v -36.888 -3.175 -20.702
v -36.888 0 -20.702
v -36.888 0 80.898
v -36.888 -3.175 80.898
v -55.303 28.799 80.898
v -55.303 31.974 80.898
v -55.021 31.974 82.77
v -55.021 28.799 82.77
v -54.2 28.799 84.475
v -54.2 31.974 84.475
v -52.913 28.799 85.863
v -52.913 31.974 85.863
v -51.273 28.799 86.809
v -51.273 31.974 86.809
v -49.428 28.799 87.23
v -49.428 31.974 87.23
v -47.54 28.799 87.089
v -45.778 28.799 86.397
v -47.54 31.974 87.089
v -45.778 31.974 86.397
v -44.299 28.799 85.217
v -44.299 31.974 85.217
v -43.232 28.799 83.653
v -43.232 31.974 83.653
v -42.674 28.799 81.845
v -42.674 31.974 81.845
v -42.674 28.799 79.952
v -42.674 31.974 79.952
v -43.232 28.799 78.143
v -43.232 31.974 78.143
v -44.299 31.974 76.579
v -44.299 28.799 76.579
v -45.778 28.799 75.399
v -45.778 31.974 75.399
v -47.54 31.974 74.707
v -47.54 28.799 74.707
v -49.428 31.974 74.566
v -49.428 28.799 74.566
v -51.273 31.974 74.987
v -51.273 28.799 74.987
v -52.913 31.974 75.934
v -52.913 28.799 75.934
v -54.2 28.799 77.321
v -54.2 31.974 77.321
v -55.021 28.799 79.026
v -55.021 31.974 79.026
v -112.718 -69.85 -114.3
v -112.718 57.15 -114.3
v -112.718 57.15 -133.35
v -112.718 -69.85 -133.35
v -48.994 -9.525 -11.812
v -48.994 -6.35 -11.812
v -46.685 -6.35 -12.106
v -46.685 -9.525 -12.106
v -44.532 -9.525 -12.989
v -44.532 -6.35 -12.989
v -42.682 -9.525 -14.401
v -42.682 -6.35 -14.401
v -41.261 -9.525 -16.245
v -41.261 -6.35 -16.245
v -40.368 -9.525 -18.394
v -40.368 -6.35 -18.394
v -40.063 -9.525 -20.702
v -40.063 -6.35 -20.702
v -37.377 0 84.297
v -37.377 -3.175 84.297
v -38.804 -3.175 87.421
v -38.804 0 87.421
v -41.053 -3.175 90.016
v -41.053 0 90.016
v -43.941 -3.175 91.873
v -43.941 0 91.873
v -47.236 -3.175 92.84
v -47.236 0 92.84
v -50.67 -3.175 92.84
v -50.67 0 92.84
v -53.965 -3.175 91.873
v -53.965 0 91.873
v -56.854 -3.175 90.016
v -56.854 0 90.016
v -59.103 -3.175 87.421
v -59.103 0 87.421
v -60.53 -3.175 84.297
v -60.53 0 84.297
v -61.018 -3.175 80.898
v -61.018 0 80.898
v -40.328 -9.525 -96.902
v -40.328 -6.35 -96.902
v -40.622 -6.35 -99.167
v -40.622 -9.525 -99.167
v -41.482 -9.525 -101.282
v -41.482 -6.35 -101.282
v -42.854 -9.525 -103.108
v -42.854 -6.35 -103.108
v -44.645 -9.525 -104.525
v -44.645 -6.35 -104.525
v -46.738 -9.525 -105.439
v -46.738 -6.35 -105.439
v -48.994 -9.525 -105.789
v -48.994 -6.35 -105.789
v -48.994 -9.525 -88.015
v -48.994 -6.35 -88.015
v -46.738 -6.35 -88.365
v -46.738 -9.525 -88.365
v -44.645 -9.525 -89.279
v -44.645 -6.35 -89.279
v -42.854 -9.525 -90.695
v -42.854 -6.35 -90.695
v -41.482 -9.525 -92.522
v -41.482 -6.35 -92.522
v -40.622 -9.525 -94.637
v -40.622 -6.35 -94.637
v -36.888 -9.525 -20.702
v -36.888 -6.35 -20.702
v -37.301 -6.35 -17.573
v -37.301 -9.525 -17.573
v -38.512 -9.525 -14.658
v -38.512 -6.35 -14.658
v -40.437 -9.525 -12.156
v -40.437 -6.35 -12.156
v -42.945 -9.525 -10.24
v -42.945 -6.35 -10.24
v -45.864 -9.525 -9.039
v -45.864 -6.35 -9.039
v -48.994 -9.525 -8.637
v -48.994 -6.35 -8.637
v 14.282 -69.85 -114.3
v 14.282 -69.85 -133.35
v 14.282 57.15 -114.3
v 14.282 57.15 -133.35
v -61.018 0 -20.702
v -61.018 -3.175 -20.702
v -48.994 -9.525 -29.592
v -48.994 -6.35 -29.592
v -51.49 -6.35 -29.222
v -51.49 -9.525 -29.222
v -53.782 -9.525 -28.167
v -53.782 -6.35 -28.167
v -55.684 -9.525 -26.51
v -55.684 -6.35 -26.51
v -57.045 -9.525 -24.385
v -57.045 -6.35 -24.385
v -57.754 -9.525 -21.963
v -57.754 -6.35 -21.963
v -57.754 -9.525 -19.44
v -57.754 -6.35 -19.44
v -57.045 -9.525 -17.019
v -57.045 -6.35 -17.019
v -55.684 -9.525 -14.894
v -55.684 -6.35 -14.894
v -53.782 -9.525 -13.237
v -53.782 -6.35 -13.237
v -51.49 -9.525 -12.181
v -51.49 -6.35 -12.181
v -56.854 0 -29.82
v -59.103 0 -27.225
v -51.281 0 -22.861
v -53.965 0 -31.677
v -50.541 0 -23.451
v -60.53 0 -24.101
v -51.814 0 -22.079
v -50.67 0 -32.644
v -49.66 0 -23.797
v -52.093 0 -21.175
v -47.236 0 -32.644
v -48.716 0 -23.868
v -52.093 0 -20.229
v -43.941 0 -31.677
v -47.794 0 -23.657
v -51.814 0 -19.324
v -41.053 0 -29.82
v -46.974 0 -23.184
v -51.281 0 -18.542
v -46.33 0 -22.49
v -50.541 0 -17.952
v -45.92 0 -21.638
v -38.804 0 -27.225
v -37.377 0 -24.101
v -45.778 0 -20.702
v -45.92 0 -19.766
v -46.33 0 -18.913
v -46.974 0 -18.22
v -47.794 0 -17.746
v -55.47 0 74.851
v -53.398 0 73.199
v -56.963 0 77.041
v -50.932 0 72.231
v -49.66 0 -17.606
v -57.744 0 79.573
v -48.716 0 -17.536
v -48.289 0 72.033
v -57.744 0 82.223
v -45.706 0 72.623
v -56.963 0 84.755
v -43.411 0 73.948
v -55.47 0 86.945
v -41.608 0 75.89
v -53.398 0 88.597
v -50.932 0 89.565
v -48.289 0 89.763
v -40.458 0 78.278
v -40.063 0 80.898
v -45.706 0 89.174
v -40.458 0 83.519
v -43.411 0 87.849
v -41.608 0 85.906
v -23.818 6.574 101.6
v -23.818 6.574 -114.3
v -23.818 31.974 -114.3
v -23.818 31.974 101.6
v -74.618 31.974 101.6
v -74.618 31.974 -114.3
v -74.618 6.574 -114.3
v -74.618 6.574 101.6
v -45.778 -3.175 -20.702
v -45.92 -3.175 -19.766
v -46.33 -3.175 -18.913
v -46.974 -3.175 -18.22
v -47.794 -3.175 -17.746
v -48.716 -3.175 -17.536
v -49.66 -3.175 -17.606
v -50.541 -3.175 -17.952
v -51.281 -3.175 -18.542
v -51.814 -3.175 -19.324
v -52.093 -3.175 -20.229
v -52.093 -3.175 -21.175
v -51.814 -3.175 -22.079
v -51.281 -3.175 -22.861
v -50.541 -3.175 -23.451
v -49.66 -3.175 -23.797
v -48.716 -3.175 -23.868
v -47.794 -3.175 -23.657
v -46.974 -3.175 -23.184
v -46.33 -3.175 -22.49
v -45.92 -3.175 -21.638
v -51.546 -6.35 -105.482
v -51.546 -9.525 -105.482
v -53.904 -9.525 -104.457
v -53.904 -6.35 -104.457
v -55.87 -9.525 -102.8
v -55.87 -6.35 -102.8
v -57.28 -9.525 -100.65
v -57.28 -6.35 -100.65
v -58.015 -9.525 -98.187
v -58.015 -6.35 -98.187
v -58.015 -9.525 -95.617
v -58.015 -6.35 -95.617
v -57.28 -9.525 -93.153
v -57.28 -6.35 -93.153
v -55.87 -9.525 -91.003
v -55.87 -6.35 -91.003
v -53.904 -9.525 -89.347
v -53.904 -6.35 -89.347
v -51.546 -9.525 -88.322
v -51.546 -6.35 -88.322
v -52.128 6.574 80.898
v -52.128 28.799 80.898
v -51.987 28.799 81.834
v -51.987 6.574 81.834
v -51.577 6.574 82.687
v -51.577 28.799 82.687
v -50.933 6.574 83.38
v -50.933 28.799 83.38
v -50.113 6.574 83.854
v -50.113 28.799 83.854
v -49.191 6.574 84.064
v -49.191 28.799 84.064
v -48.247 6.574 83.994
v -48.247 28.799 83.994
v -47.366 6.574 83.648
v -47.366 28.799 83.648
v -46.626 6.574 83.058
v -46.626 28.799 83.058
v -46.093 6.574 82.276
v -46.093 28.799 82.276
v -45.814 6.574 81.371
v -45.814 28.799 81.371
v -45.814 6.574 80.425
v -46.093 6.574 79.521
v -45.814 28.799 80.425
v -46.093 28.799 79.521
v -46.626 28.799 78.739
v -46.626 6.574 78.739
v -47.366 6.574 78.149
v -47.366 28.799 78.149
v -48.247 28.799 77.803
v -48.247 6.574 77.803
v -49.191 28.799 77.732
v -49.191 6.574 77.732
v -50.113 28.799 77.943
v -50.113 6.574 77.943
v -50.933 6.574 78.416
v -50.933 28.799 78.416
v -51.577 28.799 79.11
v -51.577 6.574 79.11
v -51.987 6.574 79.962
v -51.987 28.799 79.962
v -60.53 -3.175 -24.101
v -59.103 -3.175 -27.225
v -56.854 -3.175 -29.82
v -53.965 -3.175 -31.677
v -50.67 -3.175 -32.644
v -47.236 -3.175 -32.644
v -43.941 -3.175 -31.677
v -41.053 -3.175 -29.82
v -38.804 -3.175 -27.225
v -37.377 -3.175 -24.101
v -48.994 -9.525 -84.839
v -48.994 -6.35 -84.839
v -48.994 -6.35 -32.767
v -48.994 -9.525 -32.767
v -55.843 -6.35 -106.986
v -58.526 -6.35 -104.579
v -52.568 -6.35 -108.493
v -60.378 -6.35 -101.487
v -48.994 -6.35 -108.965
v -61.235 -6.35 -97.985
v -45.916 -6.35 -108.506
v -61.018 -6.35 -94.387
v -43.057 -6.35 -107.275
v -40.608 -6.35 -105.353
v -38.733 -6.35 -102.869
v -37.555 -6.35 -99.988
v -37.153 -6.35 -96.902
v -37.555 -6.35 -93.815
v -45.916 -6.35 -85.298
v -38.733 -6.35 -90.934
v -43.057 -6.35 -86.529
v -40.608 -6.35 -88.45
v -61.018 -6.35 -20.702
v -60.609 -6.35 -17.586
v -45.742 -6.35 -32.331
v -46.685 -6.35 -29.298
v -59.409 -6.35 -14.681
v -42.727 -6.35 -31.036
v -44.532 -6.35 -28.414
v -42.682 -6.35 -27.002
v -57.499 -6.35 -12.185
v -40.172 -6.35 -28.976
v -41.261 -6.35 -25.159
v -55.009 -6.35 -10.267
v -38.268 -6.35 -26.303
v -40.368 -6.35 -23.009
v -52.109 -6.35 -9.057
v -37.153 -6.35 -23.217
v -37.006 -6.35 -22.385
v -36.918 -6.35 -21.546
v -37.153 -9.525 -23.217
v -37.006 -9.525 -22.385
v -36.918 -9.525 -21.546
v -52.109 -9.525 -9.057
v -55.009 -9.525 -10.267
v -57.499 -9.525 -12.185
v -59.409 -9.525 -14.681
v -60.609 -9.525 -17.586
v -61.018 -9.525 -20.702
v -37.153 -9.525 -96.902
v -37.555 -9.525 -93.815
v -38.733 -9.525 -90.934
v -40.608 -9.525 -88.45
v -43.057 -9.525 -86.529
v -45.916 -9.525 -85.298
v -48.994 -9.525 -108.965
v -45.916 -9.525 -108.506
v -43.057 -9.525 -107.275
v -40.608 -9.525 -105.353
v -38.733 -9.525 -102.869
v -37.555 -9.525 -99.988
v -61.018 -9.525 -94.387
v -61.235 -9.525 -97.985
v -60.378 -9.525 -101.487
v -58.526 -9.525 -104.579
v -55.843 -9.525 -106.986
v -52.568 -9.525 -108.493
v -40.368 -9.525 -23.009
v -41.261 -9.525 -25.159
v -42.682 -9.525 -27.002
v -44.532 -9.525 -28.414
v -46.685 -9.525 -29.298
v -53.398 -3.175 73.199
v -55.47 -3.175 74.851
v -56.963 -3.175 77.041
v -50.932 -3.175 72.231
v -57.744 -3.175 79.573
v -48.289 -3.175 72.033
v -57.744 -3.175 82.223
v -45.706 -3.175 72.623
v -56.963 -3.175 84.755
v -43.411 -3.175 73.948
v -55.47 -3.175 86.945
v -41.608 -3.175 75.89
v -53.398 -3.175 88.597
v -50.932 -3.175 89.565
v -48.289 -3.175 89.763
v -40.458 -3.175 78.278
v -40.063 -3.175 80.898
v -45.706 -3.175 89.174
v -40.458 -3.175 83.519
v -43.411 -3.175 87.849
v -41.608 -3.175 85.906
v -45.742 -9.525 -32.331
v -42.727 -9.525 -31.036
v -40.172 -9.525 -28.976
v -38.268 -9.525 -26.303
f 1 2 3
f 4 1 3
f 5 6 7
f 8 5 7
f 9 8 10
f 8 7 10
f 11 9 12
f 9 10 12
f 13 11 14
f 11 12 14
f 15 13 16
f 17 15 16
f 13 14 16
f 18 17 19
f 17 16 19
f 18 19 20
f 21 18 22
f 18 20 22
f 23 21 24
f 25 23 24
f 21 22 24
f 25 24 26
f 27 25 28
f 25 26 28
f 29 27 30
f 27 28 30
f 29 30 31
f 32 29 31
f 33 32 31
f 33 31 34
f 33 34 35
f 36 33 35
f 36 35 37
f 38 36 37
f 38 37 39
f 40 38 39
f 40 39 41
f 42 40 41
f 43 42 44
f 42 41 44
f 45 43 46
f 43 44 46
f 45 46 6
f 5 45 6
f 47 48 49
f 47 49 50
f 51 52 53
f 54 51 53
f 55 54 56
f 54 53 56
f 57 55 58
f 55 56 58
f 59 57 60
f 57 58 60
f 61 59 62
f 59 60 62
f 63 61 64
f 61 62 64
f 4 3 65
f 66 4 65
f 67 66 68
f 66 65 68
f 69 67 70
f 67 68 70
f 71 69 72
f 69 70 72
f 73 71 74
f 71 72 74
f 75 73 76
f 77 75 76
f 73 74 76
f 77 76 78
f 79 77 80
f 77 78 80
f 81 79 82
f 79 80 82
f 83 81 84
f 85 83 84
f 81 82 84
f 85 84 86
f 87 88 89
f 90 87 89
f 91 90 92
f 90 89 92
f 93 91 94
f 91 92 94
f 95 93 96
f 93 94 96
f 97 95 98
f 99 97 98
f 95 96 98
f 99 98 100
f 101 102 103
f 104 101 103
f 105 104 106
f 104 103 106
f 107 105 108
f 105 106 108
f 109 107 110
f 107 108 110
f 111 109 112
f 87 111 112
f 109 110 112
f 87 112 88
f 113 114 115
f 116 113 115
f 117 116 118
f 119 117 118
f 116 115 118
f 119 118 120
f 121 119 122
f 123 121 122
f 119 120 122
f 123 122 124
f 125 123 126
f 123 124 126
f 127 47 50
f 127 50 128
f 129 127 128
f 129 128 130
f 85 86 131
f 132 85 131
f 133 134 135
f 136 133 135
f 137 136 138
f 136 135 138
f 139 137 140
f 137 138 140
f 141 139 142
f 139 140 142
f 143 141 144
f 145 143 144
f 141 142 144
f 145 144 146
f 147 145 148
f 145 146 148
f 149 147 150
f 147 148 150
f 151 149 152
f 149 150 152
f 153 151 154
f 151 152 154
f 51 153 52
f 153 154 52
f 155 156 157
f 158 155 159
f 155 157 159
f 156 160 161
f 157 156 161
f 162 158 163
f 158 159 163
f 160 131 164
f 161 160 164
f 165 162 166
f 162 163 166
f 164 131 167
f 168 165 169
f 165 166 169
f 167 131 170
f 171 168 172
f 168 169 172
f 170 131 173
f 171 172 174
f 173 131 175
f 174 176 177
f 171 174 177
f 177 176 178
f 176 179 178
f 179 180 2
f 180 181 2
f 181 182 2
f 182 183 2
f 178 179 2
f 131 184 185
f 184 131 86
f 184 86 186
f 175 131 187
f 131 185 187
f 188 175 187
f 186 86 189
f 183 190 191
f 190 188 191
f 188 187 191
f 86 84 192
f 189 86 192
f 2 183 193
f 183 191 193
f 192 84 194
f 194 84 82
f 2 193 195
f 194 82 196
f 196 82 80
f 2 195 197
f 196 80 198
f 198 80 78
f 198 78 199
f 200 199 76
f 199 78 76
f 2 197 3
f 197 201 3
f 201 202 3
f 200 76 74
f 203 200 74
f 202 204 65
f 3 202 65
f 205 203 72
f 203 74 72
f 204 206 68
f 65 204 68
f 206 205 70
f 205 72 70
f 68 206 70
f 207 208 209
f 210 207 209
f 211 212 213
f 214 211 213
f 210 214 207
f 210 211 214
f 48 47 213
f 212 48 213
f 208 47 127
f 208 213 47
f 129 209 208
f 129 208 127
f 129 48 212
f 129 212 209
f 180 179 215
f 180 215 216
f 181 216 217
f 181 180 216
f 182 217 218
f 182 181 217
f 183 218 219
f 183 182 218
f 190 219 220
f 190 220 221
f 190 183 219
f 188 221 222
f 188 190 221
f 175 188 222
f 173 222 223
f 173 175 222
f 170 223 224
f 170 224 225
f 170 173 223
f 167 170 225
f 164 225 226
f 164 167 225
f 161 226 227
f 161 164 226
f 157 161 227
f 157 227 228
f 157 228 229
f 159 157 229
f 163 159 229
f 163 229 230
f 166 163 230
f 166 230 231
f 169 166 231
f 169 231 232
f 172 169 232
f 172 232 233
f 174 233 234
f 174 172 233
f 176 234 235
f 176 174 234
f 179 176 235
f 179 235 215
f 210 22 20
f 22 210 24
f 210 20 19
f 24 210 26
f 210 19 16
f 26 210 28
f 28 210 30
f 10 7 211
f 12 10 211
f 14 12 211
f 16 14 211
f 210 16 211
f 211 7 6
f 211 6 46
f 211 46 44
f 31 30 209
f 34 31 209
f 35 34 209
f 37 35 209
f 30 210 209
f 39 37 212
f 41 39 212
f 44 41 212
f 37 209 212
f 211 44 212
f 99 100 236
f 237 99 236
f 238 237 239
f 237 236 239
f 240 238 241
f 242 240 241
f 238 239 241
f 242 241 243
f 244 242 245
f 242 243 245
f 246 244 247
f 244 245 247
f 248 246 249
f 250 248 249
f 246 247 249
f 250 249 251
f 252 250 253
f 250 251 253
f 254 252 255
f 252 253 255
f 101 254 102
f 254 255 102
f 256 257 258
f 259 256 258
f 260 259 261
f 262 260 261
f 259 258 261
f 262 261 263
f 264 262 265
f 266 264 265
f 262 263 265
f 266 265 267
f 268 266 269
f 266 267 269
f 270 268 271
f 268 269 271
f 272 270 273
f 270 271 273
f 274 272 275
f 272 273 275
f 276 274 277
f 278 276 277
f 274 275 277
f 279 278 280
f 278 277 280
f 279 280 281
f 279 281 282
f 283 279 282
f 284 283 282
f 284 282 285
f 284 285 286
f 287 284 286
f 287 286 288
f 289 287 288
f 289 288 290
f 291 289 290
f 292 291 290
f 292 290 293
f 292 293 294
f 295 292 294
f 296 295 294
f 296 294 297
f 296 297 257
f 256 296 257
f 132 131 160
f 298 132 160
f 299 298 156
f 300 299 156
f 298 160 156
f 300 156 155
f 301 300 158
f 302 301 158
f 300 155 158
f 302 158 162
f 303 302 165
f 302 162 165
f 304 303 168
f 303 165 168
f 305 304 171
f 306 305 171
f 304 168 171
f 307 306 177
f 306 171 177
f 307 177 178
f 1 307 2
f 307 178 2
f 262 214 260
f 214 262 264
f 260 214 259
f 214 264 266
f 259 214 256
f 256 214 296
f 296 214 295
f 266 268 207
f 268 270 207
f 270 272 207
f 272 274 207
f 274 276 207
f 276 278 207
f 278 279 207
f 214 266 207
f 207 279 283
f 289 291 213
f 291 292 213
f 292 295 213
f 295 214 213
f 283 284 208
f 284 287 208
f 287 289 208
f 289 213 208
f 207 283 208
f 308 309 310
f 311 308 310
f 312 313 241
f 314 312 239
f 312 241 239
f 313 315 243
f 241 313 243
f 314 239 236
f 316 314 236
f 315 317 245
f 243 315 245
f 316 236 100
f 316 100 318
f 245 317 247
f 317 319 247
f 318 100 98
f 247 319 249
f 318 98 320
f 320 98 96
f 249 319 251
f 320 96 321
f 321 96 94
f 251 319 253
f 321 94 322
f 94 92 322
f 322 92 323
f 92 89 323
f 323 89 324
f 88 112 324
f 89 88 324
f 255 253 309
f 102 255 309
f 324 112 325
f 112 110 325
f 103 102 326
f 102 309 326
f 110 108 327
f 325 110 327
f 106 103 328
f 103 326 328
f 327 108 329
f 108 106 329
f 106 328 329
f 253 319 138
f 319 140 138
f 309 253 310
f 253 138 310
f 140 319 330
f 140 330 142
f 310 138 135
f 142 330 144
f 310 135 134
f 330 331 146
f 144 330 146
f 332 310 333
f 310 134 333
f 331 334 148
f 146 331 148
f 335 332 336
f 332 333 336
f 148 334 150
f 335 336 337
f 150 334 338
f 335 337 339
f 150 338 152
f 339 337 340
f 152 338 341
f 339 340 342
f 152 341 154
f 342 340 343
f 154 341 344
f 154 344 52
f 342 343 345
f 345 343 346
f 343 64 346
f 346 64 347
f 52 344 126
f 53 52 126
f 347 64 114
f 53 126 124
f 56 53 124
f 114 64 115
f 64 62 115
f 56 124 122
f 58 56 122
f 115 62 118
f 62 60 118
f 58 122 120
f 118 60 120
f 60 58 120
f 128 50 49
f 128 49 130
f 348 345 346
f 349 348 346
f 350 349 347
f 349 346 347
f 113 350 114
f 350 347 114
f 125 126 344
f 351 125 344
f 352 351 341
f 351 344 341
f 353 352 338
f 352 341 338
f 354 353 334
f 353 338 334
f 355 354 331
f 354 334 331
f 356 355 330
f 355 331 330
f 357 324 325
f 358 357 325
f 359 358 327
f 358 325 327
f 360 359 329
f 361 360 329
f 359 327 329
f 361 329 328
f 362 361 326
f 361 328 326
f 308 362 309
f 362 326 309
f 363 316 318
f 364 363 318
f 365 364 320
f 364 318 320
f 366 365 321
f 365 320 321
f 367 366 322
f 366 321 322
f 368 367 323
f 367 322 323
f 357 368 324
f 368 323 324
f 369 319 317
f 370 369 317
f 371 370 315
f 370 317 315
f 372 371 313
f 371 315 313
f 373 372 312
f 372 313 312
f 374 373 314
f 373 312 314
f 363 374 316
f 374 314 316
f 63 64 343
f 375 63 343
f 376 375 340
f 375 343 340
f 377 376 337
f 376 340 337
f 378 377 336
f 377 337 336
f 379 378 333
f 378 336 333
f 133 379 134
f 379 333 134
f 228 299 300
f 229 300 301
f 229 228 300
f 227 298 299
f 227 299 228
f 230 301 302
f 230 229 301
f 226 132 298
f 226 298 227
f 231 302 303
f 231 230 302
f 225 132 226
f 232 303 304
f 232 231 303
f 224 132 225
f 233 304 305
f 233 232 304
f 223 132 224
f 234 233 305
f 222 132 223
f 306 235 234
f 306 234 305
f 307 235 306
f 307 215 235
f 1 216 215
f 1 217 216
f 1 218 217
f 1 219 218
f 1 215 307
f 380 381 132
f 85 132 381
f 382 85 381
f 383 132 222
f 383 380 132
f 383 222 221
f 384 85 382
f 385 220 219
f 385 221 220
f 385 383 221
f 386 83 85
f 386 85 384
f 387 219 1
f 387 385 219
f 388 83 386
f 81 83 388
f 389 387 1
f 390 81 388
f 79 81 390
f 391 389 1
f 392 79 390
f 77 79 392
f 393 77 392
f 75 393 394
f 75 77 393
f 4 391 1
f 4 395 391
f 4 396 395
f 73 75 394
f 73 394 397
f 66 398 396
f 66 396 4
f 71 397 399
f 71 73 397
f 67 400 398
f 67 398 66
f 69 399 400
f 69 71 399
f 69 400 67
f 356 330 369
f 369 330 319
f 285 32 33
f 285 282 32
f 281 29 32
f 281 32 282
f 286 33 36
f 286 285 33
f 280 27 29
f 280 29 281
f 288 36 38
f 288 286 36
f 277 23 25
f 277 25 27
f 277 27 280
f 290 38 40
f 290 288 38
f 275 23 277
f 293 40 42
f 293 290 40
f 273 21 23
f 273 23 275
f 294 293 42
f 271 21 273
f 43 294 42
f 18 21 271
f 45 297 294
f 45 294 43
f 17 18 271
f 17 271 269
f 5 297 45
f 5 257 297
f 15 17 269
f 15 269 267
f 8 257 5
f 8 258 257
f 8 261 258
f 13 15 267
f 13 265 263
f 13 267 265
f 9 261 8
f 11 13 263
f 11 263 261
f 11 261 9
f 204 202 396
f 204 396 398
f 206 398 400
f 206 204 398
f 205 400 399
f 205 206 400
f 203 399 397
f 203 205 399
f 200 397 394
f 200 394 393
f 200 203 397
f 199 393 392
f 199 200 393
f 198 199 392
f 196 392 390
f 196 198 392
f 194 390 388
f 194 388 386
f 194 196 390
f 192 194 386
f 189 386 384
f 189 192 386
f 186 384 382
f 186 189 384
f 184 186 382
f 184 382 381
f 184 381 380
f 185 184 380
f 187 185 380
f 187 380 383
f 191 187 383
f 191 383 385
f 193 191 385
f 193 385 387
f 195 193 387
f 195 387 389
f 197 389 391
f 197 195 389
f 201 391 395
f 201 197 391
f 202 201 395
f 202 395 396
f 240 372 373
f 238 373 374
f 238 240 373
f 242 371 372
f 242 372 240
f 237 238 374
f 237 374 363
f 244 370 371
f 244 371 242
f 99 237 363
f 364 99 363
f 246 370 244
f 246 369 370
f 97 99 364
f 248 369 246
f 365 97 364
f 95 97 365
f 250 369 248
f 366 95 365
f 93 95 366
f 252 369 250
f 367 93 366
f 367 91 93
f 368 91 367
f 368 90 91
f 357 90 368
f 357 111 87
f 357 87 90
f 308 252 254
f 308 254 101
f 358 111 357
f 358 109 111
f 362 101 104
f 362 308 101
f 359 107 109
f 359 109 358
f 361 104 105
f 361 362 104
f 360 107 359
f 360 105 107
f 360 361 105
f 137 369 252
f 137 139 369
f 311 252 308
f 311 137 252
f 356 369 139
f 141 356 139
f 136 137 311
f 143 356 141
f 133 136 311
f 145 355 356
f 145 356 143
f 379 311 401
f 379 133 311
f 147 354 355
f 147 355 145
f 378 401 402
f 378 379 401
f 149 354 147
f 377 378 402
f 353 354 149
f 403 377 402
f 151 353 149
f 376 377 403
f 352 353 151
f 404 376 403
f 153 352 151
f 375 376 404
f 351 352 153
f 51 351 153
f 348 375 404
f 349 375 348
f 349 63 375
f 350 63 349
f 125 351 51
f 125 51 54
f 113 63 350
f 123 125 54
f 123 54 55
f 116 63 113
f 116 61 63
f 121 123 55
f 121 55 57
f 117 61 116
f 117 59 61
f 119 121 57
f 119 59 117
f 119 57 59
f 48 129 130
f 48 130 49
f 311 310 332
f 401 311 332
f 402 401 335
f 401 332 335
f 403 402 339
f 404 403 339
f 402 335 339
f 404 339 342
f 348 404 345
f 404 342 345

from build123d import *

# Parameters (mm, degrees)
F0_R      = 8.89
F0_R_2    = 3.175
F1_DEPTH  = 3.175
F4_DEPTH  = 3.175
F7_DEPTH  = 19.05
F9_DEPTH  = 215.9
F10_R     = 3.175
F11_DEPTH = 101.8252484294
F10_R_2   = 6.35
F12_DEPTH = 3.175


with BuildPart() as f1:
    # F0 (on Front) → F1 (new body)
    with BuildSketch(Plane.XZ):
        with BuildLine():
            ThreePointArc((-61.0184661174, 80.8981371284), (-48.9534661174, 68.8331371284), (-36.8884661174, 80.8981371284))
            ThreePointArc((-36.8884661174, 80.8981371284), (-48.9534661174, 92.9631371284), (-61.0184661174, 80.8981371284))
        make_face()
        with Locations((-48.9534661174, 80.8981371284)):
            Circle(F0_R, mode=Mode.SUBTRACT)
        with BuildLine():
            Line((-36.8884661174, -20.7018628716), (-36.8884661174, 80.8981371284))
            ThreePointArc((-36.8884661174, 80.8981371284), (-48.9534661174, 68.8331371284), (-61.0184661174, 80.8981371284))
            Line((-61.0184661174, 80.8981371284), (-61.0184661174, -20.7018628716))
            ThreePointArc((-61.0184661174, -20.7018628716), (-48.9534661174, -8.6368628716), (-36.8884661174, -20.7018628716))
        make_face()
        with BuildLine():
            ThreePointArc((-61.0184661174, -20.7018628716), (-48.9534661174, -32.7668628716), (-36.8884661174, -20.7018628716))
            ThreePointArc((-36.8884661174, -20.7018628716), (-48.9534661174, -8.6368628716), (-61.0184661174, -20.7018628716))
        make_face()
        with Locations((-48.9534661174, -20.7018628716)):
            Circle(F0_R_2, mode=Mode.SUBTRACT)
    extrude(amount=F1_DEPTH)


with BuildPart() as f4:
    # F3 (on offset) → F4 (new body)
    with BuildSketch(Plane.XZ.offset(6.35)):
        with BuildLine():
            Line((-48.9942056675, -84.8389475658), (-48.9942056675, -32.7667940894))
            ThreePointArc((-48.9942056675, -32.7667940894), (-57.4991008999, -29.218690401), (-61.0184661174, -20.7018628716))
            Line((-61.0184661174, -20.7018628716), (-61.0184661174, -94.3869631738))
            ThreePointArc((-61.0184661174, -94.3869631738), (-56.7211762043, -87.453377151), (-48.9942056675, -84.8389475658))
        make_face()
        with BuildLine():
            ThreePointArc((-48.9942056675, -29.5917695241), (-57.8434661174, -20.7018628716), (-48.9942056675, -11.8119562192))
            Line((-48.9942056675, -11.8119562192), (-48.9942056675, -8.6369316539))
            ThreePointArc((-48.9942056675, -8.6369316539), (-57.4991008999, -12.1850353423), (-61.0184661174, -20.7018628716))
            ThreePointArc((-61.0184661174, -20.7018628716), (-57.4991008999, -29.218690401), (-48.9942056675, -32.7667940894))
            Line((-48.9942056675, -32.7667940894), (-48.9942056675, -29.5917695241))
        make_face()
        with BuildLine():
            Line((-48.9942056675, -8.6369316539), (-48.9942056675, -11.8119562192))
            ThreePointArc((-48.9942056675, -11.8119562192), (-42.6817069782, -14.4012964447), (-40.0634661174, -20.7018628716))
            ThreePointArc((-40.0634661174, -20.7018628716), (-42.6817069782, -27.0024292986), (-48.9942056675, -29.5917695241))
            Line((-48.9942056675, -29.5917695241), (-48.9942056675, -32.7667940894))
            ThreePointArc((-48.9942056675, -32.7667940894), (-41.3791205839, -30.0930030974), (-37.1534868789, -23.2167614721))
            ThreePointArc((-37.1534868789, -23.2167614721), (-36.9549042345, -21.9662748866), (-36.8884661174, -20.7018628716))
            ThreePointArc((-36.8884661174, -20.7018628716), (-40.4366385881, -12.1562280891), (-48.9942056675, -8.6369316539))
        make_face()
        with BuildLine():
            Line((-48.9942056675, -88.0146923465), (-48.9942056675, -84.8389475658))
            ThreePointArc((-48.9942056675, -84.8389475658), (-56.7211762043, -87.453377151), (-61.0184661174, -94.3869631738))
            ThreePointArc((-61.0184661174, -94.3869631738), (-58.5258694104, -104.5788974785), (-48.9942056675, -108.9647781775))
            Line((-48.9942056675, -108.9647781775), (-48.9942056675, -105.7890333968))
            ThreePointArc((-48.9942056675, -105.7890333968), (-58.1084871101, -96.9018628716), (-48.9942056675, -88.0146923465))
        make_face()
        with BuildLine():
            ThreePointArc((-37.1534868789, -96.9018628716), (-40.6083133021, -88.450286878), (-48.9942056675, -84.8389475658))
            Line((-48.9942056675, -84.8389475658), (-48.9942056675, -88.0146923465))
            ThreePointArc((-48.9942056675, -88.0146923465), (-42.8535061195, -90.6954854648), (-40.3284868789, -96.9018628716))
            ThreePointArc((-40.3284868789, -96.9018628716), (-42.8535061195, -103.1082402785), (-48.9942056675, -105.7890333968))
            Line((-48.9942056675, -105.7890333968), (-48.9942056675, -108.9647781775))
            ThreePointArc((-48.9942056675, -108.9647781775), (-40.6083133021, -105.3534388653), (-37.1534868789, -96.9018628716))
        make_face()
    extrude(amount=F4_DEPTH)


with BuildPart() as f7:
    # F6 (on offset) → F7 (new body)
    with BuildSketch(Plane.XY.offset(-114.3)):
        Polygon((14.2815130055, -69.85), (14.2815130055, 57.15), (-49.2184869945, 57.15), (-112.7184869945, 57.15), (-112.7184869945, -69.85), align=None)
    extrude(amount=-F7_DEPTH)

    # F8 (on offset) → F9 (join)
    with BuildSketch(Plane.XY.offset(-114.3)):
        Polygon((-74.6184869945, 6.5742484294), (-49.2184869945, 6.5742484294), (-23.8184869945, 6.5742484294), (-23.8184869945, 31.9742484294), (-74.6184869945, 31.9742484294), align=None)
    extrude(amount=F9_DEPTH)

    # F10 (on face) → F11 (cut, through all)
    with BuildSketch(Plane(origin=(0, 31.9742484294, 0), x_dir=(-1, 0, 0), z_dir=(0, 1, 0))):
        with Locations((48.9534661174, 80.8981371284)):
            Circle(F10_R)
    extrude(amount=-F11_DEPTH, mode=Mode.SUBTRACT)

    # F10 (on face) → F12 (cut)
    with BuildSketch(Plane(origin=(0, 31.9742484294, 0), x_dir=(-1, 0, 0), z_dir=(0, 1, 0))):
        with Locations((48.9534661174, 80.8981371284)):
            Circle(F10_R_2)
        with Locations((48.9534661174, 80.8981371284)):
            Circle(F10_R, mode=Mode.SUBTRACT)
        with Locations((48.9534661174, 80.8981371284)):
            Circle(F10_R)
    extrude(amount=-F12_DEPTH, mode=Mode.SUBTRACT)


solid = Compound([f1.part, f4.part, f7.part])
